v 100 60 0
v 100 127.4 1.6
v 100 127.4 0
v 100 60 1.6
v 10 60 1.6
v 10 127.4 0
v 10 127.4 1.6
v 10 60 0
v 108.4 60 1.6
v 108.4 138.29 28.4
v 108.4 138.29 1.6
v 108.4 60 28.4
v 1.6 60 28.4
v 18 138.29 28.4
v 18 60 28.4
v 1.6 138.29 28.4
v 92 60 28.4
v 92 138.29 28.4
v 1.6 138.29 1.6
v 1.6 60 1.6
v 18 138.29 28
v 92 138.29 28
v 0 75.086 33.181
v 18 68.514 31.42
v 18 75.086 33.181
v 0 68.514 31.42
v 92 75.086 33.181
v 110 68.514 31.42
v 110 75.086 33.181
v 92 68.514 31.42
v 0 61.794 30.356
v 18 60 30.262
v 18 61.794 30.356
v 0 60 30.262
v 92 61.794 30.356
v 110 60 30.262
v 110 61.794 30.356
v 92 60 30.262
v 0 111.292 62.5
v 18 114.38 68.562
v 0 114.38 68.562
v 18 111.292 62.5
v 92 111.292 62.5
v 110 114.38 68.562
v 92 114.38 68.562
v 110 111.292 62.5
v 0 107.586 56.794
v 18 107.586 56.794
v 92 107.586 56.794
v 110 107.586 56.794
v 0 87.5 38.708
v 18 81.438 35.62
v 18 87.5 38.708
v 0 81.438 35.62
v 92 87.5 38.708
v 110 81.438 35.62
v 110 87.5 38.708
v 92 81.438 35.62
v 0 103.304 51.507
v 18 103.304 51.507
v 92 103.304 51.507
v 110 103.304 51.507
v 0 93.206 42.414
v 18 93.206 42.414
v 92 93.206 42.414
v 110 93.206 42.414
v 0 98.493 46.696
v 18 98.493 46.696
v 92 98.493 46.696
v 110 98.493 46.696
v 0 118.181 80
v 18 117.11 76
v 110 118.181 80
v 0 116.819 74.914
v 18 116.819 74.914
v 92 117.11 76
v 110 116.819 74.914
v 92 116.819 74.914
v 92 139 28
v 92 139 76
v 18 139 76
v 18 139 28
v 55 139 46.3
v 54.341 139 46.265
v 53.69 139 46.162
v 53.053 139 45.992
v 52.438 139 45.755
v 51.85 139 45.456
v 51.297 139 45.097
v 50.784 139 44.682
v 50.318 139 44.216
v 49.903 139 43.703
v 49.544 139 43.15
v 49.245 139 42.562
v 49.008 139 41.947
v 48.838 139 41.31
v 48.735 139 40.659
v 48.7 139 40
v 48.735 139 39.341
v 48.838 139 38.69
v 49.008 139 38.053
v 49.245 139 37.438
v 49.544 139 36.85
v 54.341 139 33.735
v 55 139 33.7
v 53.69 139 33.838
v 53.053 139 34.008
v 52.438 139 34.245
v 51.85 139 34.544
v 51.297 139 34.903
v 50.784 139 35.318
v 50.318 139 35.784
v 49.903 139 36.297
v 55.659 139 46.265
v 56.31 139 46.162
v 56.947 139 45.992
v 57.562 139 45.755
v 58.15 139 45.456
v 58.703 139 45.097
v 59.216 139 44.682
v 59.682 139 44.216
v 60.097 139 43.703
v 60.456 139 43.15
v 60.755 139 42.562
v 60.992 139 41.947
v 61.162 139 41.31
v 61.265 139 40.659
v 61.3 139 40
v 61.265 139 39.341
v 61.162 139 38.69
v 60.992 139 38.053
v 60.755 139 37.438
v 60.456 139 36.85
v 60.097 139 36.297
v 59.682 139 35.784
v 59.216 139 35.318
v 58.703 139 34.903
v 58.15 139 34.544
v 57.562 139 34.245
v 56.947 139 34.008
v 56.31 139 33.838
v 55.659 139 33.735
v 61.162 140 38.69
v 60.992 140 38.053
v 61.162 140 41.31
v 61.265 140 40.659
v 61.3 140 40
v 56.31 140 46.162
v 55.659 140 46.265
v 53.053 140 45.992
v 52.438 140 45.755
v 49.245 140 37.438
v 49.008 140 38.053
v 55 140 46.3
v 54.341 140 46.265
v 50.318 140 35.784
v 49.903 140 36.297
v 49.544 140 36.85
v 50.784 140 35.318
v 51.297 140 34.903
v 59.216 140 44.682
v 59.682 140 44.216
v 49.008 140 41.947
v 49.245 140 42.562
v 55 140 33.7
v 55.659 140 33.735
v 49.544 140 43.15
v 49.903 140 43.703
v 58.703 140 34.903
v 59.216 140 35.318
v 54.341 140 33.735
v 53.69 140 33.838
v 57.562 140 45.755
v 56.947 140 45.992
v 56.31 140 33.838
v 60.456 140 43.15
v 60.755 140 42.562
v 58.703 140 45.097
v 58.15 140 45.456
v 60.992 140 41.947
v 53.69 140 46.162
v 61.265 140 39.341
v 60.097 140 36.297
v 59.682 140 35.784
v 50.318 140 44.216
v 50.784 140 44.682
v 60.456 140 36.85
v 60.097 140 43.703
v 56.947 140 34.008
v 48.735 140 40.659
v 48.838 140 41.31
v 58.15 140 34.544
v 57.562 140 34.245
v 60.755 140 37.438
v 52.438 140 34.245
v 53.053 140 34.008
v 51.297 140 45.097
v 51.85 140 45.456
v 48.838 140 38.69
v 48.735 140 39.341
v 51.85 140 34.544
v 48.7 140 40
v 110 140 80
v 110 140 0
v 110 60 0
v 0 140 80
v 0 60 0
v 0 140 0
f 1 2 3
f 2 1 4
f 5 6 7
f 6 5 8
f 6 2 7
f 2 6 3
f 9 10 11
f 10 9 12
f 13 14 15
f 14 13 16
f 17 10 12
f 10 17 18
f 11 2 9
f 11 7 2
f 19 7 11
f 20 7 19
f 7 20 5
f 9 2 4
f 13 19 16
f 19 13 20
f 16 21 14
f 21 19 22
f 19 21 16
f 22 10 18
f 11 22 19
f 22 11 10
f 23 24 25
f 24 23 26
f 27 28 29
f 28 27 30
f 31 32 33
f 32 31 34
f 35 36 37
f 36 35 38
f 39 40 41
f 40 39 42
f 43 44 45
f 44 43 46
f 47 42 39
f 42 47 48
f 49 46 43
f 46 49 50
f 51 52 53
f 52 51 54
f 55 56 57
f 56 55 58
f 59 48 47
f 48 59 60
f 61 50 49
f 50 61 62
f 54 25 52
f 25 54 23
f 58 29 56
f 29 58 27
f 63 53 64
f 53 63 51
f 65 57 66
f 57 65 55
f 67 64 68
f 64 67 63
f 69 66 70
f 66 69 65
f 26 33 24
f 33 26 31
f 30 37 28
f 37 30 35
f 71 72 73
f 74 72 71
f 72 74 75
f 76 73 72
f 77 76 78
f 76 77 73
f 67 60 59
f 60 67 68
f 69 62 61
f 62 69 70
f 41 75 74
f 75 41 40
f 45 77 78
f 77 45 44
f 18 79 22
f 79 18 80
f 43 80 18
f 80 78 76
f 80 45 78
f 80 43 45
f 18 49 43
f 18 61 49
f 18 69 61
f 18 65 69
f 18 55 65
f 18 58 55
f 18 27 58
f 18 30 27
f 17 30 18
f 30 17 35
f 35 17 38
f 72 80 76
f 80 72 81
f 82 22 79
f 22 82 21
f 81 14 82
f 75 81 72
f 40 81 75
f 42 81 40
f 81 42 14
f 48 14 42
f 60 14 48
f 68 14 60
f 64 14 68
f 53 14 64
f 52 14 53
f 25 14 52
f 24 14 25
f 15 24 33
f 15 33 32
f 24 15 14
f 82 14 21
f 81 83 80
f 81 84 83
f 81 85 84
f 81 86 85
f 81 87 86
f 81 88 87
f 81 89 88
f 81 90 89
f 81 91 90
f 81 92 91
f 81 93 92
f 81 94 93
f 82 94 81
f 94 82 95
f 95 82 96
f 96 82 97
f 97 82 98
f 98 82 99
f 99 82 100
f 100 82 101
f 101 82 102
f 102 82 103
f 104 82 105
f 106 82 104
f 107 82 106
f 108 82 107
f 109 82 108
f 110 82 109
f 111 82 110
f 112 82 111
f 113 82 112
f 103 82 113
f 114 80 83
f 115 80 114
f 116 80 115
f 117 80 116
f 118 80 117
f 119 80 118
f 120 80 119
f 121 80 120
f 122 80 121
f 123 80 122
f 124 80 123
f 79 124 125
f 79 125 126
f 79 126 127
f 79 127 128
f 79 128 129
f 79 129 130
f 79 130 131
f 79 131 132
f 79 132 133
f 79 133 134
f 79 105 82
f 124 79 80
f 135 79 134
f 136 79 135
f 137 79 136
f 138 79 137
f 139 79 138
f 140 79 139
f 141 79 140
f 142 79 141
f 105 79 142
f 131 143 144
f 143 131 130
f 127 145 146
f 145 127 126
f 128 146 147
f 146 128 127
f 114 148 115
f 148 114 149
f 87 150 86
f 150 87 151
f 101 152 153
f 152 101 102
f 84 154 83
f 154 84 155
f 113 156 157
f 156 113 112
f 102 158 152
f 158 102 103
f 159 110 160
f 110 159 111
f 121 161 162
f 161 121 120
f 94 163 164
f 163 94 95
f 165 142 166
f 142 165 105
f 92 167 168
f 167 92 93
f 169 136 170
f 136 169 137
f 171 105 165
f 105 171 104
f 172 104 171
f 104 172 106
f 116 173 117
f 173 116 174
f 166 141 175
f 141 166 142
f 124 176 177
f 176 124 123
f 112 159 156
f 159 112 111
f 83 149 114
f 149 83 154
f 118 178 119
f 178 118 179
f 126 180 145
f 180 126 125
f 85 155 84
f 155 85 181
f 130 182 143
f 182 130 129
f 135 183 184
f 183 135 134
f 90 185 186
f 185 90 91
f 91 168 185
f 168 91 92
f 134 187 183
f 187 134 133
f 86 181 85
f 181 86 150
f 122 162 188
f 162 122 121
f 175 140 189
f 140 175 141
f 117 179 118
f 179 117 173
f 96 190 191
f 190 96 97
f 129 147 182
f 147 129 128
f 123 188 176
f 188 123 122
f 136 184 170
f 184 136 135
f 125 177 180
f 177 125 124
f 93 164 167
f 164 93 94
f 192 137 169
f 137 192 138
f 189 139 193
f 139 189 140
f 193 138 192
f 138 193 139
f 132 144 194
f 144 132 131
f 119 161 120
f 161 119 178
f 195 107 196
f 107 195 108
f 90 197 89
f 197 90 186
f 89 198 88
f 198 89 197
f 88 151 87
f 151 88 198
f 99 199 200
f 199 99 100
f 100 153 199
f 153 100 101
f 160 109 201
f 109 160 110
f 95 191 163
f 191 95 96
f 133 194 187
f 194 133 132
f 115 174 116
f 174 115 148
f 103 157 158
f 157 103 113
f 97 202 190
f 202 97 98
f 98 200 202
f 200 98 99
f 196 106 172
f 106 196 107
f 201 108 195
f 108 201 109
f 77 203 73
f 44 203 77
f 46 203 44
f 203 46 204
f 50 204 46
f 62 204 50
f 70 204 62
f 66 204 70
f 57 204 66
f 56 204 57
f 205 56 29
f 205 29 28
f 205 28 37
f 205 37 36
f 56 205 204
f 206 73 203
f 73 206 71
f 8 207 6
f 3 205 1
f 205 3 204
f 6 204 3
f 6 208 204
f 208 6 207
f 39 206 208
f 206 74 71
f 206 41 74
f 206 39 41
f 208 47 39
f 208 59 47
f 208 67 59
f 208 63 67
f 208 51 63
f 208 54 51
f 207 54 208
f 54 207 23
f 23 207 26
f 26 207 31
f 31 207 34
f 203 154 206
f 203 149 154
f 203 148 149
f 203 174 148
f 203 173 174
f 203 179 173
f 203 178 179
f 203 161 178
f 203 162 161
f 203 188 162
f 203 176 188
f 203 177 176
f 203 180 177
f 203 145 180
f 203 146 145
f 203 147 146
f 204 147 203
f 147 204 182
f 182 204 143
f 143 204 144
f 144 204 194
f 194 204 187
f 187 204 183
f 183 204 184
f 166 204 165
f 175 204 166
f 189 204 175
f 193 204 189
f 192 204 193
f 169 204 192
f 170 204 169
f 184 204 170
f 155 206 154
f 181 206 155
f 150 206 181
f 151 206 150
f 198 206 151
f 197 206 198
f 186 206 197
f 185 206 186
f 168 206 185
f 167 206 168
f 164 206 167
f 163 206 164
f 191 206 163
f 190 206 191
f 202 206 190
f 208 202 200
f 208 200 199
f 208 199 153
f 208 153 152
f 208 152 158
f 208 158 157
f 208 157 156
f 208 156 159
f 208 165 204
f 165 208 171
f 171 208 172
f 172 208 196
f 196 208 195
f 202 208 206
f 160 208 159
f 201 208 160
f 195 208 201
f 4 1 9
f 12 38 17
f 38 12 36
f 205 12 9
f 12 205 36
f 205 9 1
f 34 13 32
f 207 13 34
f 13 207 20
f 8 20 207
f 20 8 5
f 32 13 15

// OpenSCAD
caseWidth = 110;
caseHeight = 30;
$fn=60;

module raspberryPi() {
}

module rfidPcb() {
}
    

module labelWriter() {
    difference() {
        union() {
            cube([125, 185, 140]);
        }
        union(){ 
            translate([(125 - 55)/2, 125 ,-0.1]) {
                cube([55, 45, 20]);
            }
            translate([(125 - 40)/2, 125 ,-0.1]) {
                #cube([40, 65, 20]);
            }
        }
    }
}


module piCase() {
    
    /*
    // Front Section of the back half
    difference() {
        union() {
            cube([caseWidth, 60, 30]);
        }
        union() {
            // Hollow the part below the printer
            translate([1.6,-1,1.6]) {
                cube([caseWidth-3.2, 62, 30-3.2]);
            }
            
            // Base cutout for electronics insertion.
            translate([10,-1,-1]) {
                cube([caseWidth-20, 62, 5]);
            }
        }
    }
    */
    
    // Back section of the back half
    translate([0,60,0]) {
        difference() {
            union() {
                cube([caseWidth, 80, 80]);
            }
            union() {
                // Base cutout for electronics insertion.
                translate([10,-1,-1]) {
                    cube([caseWidth-20, 80-11.6, 5]);
                }
                
                // Hollow the part below the printer
                translate([1.6,-0.1,1.6]) {
                    cube([caseWidth-3.2, 80-1.61, 30-3.2]);
                }
                
                // Curve the end for the printer to sit into
                translate([-0.1,-5,caseHeight + 65]) {
                    rotate([0,90,0]) {
                        cylinder(d=130, h=caseWidth+0.2);
                    }
                }
                // Cut out the square recess for printer cabel
                translate([(caseWidth-74)/2,-1,caseHeight-2]) {
                   # cube([74, 80, 48]);
                }
                
                // Hole for the power connector.
                powerHoleDiameter = 12.6;
                translate([caseWidth/2,82,40]) {
                    rotate([90,0,0]) {
                        cylinder(d=powerHoleDiameter, h=5);
                    }
                }
            }
        }
    }
    
        
    
}

module rfidCase() {   
    
    difference() {
        union() {
            cube([caseWidth, 120, 30]);
        }
        union() {
            // Hollow the part below the printer
            translate([1.6,-0.1,1.6]) {
                cube([caseWidth-3.2, 122+5, 30-3.2]);
            }
            
            // Base cutout for electronics insertion.
            translate([10,10,-1]) {
                cube([caseWidth-20, 111, 5]);
            }
        }
    }
    
    translate([0,00,0]) {
    
    // Give it a rounded nose to make it look better
    // and to help print so it can be printed vertically.
    translate([0,0,caseHeight/2]) {
        difference() {
            union() {
                rotate([0,90,-0]) {
                    cylinder(d=caseHeight, h=caseWidth);
                }
            }
            union() {
                translate([1.6,0,0]) {
                    rotate([0,90,-0]) {
                        cylinder(d=caseHeight-3.2, h=caseWidth - 3.2);
                    }
                    translate([0,-2,-(caseHeight/2)+1.6]) {
                        cube([caseWidth-3.2,caseHeight/2+5,caseHeight-3.2]);
                    }
                }
            }
        }
    }
}
}

color("blue") {
    piCase();
}

translate([0,-120,0]) {
    color("green") {
        //rfidCase();
    }
}

// Our case is 110mm wide
// dymo is 125 so hase 15mm overhand (7.5mm each side)
// back Pi case to start 70mm in (at our y=0)
// front RFID case to be about 50mm in front of the printer
translate([-7.5,-70,caseHeight + 00]) {
    %labelWriter();
    %raspberryPi();
    %rfidPcb();
}
